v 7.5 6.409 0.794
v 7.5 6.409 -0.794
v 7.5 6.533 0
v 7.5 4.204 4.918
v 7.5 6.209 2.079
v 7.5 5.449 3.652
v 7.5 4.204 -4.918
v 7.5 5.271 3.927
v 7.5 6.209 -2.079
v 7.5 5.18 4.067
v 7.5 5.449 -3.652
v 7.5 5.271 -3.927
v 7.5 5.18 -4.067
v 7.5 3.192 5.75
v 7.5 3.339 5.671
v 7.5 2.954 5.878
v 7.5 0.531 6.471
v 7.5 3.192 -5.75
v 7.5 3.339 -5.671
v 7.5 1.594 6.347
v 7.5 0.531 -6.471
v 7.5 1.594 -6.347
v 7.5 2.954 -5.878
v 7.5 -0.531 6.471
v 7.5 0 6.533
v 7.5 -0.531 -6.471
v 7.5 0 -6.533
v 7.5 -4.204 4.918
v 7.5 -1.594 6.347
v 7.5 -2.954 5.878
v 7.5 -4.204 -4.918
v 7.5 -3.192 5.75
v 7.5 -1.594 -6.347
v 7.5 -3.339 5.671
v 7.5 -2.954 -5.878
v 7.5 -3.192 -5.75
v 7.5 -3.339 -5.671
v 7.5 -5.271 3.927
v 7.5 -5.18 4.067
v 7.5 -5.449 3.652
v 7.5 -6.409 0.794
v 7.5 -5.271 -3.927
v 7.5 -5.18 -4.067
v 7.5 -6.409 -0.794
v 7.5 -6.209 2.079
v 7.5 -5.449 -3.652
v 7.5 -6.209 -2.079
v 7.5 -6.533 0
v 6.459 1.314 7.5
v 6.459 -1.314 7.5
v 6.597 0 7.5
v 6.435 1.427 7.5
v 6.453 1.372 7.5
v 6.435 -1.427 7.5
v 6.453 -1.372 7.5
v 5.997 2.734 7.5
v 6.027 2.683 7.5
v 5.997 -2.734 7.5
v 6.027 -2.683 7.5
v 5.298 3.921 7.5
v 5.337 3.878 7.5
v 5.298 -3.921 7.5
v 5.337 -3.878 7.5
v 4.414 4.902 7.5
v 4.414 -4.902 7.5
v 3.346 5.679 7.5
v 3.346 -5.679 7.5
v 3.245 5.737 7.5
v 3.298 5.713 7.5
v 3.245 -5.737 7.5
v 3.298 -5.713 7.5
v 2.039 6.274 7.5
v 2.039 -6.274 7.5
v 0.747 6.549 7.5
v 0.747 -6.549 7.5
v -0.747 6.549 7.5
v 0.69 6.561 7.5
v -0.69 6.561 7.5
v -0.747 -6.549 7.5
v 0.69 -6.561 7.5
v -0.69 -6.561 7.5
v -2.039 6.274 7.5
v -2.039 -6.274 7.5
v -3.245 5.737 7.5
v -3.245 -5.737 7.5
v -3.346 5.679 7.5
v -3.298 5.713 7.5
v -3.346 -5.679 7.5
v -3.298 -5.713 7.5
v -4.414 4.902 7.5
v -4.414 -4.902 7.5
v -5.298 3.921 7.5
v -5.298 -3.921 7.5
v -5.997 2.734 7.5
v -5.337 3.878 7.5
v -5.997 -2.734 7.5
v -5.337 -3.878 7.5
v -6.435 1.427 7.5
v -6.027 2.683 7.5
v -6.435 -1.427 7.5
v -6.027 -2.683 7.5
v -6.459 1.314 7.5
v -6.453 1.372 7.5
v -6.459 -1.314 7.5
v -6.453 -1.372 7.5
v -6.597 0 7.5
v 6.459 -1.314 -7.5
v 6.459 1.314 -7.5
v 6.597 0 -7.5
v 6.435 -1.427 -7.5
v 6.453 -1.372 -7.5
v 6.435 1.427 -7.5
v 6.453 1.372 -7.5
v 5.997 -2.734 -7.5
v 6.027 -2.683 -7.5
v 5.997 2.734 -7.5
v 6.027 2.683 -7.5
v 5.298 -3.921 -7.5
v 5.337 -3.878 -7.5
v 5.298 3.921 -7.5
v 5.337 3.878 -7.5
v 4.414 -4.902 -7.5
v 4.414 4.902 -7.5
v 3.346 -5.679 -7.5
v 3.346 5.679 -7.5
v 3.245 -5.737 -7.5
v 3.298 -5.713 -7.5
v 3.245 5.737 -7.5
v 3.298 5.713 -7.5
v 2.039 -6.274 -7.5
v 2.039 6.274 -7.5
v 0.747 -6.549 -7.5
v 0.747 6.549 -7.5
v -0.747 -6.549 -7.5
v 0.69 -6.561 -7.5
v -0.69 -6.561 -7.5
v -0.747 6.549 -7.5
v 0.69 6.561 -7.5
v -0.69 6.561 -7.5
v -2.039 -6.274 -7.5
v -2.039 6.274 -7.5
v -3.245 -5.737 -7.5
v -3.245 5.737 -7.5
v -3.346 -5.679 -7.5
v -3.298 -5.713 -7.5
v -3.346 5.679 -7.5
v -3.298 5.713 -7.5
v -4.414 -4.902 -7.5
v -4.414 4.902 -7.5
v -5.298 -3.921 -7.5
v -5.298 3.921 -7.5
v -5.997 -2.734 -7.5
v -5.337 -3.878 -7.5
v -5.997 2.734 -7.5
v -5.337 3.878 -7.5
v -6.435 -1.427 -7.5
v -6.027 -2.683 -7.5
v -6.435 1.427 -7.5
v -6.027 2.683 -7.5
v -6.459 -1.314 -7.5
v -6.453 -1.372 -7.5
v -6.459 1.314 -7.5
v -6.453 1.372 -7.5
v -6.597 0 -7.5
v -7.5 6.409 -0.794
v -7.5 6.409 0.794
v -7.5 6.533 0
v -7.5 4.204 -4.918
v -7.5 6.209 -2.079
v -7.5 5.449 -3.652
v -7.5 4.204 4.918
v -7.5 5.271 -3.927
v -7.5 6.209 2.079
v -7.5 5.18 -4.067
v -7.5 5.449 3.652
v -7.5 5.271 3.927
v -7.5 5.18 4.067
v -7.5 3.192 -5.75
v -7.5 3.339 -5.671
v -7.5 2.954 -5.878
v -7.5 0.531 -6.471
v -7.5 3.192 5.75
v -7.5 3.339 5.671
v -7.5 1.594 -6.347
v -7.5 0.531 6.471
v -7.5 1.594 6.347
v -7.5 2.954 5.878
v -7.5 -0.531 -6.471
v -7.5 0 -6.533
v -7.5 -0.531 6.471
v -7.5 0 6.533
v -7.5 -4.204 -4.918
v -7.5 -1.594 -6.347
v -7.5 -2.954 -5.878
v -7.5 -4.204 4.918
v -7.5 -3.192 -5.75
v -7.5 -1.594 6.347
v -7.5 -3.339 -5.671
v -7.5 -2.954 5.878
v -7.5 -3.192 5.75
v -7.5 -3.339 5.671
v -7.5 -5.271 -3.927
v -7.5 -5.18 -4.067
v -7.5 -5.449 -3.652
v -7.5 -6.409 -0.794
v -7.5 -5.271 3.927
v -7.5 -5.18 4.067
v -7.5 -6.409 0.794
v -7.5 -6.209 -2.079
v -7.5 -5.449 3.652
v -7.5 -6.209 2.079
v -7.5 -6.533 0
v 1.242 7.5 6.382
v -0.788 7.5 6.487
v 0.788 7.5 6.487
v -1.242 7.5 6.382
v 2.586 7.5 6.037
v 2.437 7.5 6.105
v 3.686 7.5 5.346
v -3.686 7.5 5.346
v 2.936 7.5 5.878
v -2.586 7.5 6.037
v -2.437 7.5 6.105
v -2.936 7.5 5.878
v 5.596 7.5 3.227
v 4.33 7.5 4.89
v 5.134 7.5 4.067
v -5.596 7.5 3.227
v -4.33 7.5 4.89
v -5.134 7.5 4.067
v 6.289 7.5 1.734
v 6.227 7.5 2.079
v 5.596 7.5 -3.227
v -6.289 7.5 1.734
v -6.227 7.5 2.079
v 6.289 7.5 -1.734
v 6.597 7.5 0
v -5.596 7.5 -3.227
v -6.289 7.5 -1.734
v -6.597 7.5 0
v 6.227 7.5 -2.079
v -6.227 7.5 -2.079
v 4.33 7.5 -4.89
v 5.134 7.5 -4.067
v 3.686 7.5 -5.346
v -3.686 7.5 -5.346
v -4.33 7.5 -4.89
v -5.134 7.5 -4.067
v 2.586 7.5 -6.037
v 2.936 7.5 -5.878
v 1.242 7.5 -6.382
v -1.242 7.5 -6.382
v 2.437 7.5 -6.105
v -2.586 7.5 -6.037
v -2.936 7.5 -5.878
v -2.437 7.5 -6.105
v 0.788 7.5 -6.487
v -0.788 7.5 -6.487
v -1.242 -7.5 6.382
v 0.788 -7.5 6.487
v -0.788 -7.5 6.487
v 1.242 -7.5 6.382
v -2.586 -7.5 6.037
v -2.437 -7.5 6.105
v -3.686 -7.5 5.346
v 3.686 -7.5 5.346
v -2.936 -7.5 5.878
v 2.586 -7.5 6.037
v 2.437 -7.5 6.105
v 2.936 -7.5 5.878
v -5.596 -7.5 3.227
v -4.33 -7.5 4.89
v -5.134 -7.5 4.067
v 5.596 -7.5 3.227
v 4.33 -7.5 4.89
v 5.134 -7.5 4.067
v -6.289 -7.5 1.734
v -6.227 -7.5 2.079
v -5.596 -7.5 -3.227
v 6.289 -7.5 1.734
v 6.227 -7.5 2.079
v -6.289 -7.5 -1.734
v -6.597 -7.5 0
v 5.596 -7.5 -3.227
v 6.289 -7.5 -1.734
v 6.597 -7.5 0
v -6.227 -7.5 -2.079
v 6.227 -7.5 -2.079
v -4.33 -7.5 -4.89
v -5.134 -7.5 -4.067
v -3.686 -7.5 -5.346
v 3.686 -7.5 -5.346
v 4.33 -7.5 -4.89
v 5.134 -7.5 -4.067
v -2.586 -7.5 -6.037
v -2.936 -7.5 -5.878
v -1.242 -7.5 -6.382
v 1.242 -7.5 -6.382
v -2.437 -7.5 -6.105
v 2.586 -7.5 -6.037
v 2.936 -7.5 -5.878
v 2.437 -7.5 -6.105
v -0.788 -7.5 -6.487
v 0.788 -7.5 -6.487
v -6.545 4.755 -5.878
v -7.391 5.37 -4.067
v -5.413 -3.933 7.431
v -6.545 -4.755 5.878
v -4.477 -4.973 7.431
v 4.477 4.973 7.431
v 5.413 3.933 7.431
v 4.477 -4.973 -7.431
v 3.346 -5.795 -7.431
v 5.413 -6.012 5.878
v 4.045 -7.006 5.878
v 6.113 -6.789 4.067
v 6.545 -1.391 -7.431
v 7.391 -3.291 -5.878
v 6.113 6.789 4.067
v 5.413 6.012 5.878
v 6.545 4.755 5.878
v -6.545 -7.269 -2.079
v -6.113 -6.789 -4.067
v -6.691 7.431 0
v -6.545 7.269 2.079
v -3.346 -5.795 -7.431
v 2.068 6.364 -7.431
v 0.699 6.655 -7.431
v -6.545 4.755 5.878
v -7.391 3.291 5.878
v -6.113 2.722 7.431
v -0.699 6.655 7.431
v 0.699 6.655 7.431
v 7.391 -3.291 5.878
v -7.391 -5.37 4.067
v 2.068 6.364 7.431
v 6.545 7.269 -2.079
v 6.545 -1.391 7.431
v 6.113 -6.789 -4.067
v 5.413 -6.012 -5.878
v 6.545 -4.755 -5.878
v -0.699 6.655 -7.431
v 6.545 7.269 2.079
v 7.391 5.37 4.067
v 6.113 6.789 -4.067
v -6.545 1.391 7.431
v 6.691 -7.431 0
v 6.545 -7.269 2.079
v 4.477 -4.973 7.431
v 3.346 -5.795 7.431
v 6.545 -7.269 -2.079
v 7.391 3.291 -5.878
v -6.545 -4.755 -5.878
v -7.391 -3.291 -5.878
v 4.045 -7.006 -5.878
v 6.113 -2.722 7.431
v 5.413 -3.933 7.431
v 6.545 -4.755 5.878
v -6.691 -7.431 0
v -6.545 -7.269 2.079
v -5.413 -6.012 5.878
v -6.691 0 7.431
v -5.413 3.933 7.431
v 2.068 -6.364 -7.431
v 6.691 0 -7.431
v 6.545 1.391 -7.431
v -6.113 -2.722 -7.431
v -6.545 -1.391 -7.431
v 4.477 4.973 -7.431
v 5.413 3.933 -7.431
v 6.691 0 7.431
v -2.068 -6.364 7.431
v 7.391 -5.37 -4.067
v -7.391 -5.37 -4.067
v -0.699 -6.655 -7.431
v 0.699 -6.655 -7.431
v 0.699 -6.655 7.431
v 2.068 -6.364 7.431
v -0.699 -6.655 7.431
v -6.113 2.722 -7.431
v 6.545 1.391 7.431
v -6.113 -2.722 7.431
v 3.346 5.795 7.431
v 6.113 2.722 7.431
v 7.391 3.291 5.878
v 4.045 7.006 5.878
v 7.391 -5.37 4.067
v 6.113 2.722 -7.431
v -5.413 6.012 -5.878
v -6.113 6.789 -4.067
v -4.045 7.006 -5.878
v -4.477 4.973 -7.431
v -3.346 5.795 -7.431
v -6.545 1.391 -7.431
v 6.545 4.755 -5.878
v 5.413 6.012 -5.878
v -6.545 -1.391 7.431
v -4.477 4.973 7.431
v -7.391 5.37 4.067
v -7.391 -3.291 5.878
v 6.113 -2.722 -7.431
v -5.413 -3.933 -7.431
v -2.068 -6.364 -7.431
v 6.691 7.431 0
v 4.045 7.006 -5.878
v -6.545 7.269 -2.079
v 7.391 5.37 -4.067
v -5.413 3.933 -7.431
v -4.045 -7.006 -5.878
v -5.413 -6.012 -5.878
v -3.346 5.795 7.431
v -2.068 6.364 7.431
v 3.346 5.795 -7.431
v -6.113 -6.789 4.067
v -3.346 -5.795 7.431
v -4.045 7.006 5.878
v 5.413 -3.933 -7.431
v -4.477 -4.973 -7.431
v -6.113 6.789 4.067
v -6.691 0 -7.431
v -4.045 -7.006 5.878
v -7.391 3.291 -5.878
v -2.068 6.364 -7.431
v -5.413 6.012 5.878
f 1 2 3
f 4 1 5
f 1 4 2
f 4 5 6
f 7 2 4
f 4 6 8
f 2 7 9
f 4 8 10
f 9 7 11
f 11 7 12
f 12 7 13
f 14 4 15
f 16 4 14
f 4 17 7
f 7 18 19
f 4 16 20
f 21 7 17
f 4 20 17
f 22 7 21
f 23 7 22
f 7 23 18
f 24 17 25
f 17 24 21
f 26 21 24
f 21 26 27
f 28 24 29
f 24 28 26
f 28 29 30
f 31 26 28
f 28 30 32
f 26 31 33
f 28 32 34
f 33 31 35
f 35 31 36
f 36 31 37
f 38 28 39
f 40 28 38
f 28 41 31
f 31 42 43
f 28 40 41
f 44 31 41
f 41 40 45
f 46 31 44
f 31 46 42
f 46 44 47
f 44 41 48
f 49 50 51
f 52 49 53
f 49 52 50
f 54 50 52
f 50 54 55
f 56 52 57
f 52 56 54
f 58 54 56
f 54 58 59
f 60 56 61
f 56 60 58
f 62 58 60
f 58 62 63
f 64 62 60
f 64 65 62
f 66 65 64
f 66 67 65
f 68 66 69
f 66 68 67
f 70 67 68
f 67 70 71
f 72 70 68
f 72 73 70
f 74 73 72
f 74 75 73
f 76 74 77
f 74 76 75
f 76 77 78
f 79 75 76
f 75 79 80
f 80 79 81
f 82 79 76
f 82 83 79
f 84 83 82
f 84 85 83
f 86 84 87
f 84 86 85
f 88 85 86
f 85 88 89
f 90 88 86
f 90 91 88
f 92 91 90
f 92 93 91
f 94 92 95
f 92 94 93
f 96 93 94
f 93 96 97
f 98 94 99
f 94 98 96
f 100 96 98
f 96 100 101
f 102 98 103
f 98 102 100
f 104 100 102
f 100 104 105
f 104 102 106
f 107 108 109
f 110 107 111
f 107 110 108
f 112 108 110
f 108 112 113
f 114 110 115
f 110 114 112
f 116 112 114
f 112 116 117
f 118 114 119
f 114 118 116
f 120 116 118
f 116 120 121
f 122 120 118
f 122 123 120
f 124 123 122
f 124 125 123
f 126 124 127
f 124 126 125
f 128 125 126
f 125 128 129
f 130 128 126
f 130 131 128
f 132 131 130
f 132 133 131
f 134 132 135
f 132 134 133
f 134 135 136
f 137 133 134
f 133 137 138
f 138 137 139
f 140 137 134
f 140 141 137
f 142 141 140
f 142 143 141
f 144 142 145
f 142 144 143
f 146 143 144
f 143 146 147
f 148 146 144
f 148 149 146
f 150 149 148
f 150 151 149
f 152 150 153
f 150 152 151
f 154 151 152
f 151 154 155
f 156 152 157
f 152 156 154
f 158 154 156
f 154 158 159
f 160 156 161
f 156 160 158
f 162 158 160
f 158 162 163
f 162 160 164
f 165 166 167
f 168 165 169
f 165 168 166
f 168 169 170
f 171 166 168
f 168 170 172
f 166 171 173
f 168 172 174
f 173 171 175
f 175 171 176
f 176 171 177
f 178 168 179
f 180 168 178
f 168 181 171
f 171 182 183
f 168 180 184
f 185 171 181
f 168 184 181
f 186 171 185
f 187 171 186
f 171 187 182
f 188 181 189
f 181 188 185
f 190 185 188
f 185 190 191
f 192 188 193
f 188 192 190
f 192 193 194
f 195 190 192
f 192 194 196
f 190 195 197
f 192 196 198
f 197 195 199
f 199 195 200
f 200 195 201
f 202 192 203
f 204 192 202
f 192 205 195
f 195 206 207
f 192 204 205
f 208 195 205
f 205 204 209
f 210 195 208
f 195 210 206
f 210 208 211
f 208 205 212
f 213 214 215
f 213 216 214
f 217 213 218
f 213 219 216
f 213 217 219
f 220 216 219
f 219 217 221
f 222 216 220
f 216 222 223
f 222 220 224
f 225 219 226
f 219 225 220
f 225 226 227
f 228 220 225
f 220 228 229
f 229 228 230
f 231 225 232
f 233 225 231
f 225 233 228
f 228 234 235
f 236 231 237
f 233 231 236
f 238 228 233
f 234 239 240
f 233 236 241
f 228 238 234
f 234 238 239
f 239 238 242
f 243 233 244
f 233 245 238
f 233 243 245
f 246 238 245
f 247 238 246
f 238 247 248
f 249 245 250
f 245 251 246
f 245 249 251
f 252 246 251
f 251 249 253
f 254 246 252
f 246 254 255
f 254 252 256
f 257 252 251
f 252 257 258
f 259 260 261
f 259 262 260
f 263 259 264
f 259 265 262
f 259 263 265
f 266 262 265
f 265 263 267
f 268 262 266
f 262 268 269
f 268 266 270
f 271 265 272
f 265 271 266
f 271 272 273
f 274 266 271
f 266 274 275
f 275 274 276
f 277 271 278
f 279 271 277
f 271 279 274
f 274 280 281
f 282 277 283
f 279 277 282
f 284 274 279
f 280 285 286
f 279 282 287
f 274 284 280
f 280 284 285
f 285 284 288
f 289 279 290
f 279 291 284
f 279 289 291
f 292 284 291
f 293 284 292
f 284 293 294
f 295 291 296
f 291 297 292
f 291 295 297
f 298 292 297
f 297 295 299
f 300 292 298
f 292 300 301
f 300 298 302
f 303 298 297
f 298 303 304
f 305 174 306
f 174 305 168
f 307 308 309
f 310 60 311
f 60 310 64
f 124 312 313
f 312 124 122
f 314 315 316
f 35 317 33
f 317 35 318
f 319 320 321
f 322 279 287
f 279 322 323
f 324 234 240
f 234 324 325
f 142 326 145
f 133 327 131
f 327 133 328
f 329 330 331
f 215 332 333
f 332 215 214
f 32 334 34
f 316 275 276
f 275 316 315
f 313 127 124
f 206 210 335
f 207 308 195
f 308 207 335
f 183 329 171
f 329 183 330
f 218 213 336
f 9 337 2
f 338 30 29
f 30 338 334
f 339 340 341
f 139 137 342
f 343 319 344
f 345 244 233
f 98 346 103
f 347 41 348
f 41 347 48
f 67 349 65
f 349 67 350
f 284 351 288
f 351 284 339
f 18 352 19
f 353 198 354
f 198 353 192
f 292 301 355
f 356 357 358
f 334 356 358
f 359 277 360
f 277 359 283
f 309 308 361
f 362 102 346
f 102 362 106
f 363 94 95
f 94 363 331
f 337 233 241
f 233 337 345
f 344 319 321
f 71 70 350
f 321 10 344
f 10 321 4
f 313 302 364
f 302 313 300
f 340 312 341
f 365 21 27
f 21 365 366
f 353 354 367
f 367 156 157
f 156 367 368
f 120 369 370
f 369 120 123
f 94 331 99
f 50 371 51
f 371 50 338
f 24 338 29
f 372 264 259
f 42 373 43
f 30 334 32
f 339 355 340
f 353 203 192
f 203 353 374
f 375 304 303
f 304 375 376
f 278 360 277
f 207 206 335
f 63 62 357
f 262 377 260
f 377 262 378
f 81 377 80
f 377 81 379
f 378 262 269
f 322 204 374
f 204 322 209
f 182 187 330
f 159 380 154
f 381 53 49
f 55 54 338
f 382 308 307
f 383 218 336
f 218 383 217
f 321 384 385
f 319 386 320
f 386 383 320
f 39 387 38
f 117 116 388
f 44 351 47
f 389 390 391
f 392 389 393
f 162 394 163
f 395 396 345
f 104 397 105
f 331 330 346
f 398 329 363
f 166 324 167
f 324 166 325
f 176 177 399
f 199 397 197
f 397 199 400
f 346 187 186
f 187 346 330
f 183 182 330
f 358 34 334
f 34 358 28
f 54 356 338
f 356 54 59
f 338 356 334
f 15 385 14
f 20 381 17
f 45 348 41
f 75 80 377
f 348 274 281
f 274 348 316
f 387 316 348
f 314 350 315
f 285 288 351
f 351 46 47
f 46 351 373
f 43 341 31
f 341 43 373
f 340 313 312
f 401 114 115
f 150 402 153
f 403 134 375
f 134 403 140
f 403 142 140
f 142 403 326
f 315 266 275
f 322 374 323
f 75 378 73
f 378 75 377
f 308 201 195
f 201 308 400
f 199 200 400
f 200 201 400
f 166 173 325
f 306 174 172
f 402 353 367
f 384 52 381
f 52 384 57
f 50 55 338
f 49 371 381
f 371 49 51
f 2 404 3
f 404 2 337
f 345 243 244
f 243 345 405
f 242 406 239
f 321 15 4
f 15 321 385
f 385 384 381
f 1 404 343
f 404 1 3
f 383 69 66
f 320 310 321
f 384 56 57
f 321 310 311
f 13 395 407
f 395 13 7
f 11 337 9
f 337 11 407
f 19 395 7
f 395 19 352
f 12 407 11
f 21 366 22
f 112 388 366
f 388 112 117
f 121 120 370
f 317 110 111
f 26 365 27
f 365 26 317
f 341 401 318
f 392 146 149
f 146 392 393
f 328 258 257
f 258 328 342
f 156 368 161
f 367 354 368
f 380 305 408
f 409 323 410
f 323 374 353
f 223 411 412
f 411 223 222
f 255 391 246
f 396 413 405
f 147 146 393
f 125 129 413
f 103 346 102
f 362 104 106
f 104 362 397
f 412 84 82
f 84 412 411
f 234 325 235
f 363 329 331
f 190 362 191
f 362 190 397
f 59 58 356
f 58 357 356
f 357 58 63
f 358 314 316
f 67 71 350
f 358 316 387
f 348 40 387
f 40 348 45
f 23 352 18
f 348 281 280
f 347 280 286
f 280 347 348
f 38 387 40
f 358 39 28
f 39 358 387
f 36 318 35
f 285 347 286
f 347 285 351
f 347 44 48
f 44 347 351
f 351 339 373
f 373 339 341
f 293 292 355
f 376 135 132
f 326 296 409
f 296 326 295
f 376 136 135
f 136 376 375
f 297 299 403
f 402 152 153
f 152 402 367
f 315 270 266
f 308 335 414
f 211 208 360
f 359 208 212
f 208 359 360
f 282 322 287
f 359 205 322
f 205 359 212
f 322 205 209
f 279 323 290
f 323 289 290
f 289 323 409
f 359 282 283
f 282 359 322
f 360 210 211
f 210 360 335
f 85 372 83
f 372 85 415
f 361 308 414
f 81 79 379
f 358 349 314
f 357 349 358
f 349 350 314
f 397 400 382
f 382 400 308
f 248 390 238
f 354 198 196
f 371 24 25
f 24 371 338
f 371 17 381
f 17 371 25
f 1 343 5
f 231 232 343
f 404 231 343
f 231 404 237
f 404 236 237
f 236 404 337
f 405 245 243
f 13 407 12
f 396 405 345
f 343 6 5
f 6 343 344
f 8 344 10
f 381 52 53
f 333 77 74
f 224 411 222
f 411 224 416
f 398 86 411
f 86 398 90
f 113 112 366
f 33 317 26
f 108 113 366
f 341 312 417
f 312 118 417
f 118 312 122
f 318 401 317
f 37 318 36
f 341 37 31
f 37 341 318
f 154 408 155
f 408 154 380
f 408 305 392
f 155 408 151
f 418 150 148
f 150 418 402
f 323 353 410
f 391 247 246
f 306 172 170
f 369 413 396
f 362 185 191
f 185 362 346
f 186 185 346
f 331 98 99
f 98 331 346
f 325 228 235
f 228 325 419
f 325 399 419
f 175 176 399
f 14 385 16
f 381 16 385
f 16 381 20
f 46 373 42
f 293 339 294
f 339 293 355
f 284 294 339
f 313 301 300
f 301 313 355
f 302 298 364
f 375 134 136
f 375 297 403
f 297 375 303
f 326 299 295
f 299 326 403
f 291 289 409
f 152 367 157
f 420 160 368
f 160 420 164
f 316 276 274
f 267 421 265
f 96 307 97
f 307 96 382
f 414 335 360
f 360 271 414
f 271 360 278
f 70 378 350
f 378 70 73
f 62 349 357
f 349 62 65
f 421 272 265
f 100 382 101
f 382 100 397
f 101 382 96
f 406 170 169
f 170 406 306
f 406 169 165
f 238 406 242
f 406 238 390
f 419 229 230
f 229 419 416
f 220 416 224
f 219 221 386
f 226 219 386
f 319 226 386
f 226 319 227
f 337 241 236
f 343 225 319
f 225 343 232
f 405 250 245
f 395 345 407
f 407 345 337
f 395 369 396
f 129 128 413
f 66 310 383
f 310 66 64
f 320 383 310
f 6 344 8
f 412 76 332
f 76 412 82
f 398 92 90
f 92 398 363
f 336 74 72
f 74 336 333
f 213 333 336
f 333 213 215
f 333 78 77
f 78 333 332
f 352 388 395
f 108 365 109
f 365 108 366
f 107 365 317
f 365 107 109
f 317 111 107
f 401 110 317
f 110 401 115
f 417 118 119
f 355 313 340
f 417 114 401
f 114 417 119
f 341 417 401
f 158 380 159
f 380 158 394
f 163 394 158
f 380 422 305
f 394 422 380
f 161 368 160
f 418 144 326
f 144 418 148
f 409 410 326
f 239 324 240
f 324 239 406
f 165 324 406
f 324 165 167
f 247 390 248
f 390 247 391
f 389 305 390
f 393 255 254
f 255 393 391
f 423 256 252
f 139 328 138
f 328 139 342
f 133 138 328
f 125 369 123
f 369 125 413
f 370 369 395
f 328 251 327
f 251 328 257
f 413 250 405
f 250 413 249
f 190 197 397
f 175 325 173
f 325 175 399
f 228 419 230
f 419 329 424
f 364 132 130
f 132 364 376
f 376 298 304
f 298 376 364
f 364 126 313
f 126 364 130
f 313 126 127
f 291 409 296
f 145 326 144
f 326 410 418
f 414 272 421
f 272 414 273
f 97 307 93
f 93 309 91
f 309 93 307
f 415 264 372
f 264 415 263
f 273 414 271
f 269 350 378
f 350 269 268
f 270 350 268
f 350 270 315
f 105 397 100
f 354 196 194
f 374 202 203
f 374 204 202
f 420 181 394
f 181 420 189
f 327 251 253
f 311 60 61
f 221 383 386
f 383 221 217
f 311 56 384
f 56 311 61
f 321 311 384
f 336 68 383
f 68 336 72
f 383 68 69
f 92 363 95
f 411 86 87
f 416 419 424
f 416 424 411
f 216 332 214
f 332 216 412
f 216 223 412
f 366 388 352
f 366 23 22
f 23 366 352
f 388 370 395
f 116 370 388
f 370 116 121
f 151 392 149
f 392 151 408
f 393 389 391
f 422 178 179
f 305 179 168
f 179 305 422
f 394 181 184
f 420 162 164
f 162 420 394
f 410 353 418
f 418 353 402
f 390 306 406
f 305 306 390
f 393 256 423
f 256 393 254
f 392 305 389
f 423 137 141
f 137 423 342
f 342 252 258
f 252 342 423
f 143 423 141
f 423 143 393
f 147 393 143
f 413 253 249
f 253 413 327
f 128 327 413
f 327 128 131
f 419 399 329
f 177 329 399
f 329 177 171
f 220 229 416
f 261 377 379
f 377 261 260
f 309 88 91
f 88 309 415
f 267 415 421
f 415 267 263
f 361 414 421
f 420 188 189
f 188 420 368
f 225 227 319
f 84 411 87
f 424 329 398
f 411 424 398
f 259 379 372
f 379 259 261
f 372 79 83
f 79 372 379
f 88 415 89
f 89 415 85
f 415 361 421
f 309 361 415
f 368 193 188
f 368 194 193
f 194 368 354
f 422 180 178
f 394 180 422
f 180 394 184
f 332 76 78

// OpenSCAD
//Cube Size
cubeSize = 15;//[5,10,15,20,25]

//Shere Size
sphereSize = 10;//[5:20]

intersection() {
    cube(cubeSize, center=true);
    sphere(sphereSize);
}
